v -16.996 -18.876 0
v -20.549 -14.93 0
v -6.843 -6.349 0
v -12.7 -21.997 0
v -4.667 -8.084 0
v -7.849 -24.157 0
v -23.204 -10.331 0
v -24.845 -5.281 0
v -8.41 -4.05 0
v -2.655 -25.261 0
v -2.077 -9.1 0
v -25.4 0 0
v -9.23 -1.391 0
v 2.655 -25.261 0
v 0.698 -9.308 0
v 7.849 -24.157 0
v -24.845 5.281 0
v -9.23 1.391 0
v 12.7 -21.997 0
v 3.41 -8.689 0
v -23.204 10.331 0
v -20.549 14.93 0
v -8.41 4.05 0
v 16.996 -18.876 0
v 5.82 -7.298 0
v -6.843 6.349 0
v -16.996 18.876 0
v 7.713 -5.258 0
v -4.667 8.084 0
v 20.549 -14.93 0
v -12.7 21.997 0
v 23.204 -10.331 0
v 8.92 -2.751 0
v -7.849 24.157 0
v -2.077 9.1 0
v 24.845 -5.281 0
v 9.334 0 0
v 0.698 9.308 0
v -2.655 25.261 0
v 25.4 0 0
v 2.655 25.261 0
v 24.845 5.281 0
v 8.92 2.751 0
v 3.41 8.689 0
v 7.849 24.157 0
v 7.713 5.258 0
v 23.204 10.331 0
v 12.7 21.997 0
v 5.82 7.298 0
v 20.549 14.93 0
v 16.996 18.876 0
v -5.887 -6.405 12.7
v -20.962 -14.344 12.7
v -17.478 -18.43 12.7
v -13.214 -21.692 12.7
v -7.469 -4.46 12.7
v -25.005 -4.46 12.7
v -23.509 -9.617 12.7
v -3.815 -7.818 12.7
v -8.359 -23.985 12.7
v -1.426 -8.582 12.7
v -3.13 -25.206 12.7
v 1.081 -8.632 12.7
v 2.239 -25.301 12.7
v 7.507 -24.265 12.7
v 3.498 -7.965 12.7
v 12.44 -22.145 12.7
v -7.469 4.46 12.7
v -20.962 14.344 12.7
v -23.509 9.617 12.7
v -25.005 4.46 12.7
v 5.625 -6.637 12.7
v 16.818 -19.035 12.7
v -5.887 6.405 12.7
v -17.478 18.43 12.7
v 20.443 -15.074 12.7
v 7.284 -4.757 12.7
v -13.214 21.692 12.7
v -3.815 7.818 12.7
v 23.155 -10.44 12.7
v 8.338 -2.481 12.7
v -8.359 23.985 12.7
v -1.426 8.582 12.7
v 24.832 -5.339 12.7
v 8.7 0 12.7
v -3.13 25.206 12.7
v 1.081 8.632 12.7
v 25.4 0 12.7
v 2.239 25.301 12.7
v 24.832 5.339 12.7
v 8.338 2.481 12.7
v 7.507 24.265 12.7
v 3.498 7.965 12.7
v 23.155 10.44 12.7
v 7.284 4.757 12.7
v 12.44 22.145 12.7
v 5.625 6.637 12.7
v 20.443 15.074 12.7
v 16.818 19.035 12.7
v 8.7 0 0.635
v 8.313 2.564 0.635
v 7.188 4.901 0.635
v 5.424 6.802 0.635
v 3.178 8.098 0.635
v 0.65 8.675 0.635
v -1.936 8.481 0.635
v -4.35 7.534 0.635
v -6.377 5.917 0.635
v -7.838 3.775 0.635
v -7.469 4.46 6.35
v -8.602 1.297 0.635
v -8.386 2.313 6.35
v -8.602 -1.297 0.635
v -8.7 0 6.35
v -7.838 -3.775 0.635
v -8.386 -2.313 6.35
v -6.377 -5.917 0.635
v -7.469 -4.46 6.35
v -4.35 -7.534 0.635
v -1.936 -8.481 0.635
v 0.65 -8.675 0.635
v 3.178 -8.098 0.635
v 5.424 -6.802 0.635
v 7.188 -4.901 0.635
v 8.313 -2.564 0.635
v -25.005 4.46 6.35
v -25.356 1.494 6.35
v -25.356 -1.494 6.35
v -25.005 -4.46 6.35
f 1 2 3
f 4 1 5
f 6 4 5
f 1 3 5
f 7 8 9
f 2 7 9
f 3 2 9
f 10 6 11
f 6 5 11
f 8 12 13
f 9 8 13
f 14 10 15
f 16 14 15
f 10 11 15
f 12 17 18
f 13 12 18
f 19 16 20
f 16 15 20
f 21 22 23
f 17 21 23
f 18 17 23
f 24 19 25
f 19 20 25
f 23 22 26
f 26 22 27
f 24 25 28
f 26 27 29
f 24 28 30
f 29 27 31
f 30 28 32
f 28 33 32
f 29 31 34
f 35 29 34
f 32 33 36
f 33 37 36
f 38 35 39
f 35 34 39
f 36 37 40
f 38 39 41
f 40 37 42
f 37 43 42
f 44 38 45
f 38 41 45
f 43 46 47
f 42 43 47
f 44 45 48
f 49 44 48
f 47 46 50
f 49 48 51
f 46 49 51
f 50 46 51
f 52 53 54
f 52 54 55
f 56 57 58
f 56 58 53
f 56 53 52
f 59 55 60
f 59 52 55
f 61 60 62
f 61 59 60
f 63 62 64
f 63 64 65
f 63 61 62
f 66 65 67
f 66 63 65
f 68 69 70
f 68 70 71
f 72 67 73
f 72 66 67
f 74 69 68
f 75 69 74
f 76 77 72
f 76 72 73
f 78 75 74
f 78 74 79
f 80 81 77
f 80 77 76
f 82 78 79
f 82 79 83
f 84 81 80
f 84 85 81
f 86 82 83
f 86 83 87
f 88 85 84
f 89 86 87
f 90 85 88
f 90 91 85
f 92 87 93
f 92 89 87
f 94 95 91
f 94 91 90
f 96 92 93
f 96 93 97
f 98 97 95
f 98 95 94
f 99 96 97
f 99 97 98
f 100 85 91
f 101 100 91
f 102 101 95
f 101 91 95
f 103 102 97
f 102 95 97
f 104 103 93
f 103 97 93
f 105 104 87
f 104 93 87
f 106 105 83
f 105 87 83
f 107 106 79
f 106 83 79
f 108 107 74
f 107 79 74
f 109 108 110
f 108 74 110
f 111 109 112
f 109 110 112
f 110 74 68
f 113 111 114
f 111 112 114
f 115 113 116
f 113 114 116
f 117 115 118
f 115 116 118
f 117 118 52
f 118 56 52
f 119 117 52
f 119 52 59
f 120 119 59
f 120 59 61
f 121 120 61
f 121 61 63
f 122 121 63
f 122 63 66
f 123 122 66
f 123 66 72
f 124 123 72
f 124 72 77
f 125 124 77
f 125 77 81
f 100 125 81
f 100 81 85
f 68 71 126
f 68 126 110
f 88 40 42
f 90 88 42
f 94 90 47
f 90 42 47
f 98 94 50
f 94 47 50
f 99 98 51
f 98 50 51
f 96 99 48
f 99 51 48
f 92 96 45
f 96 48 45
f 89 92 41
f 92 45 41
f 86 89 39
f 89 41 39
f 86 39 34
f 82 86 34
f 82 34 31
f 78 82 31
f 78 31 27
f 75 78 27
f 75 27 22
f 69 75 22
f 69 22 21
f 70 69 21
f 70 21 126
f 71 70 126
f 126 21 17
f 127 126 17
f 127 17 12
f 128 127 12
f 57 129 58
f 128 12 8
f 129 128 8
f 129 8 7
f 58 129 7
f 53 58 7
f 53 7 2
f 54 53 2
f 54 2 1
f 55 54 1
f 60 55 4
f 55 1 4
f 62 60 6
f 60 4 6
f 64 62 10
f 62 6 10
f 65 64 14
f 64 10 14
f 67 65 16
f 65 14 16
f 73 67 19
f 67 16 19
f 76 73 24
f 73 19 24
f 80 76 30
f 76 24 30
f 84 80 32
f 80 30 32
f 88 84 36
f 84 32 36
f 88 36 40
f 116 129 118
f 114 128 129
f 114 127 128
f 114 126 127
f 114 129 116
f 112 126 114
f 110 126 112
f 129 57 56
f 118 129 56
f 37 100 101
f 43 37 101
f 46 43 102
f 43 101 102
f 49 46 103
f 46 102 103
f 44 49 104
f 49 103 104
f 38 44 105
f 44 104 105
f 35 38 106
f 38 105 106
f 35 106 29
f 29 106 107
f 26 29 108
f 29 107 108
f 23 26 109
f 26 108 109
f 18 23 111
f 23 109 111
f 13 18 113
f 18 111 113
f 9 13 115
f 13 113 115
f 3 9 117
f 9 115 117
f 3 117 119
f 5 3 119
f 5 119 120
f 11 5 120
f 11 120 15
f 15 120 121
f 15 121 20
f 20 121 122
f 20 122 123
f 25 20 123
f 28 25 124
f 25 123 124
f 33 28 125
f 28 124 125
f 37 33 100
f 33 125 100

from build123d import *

# Parameters (mm, degrees)
F0_R     = 25.4
F1_DEPTH = 12.7
F2_R     = 8.6995
F3_DEPTH = 25.4
F4_W     = 19.947653
F4_H     = 8.920466
F5_DEPTH = 6.35
F6_SIZE  = 0.635


with BuildPart() as f1:
    # F0 (on Top) → F1 (new body)
    with BuildSketch(Plane.XY):
        Circle(F0_R)
    extrude(amount=F1_DEPTH)

    # F2 (on face) → F3 (cut)
    with BuildSketch(Plane.XY.offset(12.7)):
        Circle(F2_R)
    extrude(amount=-F3_DEPTH, mode=Mode.SUBTRACT)

    # F4 (on face) → F5 (cut)
    with BuildSketch(Plane.XY.offset(12.7)):
        with Locations((-17.442937, 0)):
            Rectangle(F4_W, F4_H)
    extrude(amount=-F5_DEPTH, mode=Mode.SUBTRACT)

    # F6
    f6_edges = [f1.edges().sort_by_distance(p)[0] for p in [
        (-8.6995, 0, 0),
    ]]
    chamfer(f6_edges, length=F6_SIZE)


solid = f1.part
